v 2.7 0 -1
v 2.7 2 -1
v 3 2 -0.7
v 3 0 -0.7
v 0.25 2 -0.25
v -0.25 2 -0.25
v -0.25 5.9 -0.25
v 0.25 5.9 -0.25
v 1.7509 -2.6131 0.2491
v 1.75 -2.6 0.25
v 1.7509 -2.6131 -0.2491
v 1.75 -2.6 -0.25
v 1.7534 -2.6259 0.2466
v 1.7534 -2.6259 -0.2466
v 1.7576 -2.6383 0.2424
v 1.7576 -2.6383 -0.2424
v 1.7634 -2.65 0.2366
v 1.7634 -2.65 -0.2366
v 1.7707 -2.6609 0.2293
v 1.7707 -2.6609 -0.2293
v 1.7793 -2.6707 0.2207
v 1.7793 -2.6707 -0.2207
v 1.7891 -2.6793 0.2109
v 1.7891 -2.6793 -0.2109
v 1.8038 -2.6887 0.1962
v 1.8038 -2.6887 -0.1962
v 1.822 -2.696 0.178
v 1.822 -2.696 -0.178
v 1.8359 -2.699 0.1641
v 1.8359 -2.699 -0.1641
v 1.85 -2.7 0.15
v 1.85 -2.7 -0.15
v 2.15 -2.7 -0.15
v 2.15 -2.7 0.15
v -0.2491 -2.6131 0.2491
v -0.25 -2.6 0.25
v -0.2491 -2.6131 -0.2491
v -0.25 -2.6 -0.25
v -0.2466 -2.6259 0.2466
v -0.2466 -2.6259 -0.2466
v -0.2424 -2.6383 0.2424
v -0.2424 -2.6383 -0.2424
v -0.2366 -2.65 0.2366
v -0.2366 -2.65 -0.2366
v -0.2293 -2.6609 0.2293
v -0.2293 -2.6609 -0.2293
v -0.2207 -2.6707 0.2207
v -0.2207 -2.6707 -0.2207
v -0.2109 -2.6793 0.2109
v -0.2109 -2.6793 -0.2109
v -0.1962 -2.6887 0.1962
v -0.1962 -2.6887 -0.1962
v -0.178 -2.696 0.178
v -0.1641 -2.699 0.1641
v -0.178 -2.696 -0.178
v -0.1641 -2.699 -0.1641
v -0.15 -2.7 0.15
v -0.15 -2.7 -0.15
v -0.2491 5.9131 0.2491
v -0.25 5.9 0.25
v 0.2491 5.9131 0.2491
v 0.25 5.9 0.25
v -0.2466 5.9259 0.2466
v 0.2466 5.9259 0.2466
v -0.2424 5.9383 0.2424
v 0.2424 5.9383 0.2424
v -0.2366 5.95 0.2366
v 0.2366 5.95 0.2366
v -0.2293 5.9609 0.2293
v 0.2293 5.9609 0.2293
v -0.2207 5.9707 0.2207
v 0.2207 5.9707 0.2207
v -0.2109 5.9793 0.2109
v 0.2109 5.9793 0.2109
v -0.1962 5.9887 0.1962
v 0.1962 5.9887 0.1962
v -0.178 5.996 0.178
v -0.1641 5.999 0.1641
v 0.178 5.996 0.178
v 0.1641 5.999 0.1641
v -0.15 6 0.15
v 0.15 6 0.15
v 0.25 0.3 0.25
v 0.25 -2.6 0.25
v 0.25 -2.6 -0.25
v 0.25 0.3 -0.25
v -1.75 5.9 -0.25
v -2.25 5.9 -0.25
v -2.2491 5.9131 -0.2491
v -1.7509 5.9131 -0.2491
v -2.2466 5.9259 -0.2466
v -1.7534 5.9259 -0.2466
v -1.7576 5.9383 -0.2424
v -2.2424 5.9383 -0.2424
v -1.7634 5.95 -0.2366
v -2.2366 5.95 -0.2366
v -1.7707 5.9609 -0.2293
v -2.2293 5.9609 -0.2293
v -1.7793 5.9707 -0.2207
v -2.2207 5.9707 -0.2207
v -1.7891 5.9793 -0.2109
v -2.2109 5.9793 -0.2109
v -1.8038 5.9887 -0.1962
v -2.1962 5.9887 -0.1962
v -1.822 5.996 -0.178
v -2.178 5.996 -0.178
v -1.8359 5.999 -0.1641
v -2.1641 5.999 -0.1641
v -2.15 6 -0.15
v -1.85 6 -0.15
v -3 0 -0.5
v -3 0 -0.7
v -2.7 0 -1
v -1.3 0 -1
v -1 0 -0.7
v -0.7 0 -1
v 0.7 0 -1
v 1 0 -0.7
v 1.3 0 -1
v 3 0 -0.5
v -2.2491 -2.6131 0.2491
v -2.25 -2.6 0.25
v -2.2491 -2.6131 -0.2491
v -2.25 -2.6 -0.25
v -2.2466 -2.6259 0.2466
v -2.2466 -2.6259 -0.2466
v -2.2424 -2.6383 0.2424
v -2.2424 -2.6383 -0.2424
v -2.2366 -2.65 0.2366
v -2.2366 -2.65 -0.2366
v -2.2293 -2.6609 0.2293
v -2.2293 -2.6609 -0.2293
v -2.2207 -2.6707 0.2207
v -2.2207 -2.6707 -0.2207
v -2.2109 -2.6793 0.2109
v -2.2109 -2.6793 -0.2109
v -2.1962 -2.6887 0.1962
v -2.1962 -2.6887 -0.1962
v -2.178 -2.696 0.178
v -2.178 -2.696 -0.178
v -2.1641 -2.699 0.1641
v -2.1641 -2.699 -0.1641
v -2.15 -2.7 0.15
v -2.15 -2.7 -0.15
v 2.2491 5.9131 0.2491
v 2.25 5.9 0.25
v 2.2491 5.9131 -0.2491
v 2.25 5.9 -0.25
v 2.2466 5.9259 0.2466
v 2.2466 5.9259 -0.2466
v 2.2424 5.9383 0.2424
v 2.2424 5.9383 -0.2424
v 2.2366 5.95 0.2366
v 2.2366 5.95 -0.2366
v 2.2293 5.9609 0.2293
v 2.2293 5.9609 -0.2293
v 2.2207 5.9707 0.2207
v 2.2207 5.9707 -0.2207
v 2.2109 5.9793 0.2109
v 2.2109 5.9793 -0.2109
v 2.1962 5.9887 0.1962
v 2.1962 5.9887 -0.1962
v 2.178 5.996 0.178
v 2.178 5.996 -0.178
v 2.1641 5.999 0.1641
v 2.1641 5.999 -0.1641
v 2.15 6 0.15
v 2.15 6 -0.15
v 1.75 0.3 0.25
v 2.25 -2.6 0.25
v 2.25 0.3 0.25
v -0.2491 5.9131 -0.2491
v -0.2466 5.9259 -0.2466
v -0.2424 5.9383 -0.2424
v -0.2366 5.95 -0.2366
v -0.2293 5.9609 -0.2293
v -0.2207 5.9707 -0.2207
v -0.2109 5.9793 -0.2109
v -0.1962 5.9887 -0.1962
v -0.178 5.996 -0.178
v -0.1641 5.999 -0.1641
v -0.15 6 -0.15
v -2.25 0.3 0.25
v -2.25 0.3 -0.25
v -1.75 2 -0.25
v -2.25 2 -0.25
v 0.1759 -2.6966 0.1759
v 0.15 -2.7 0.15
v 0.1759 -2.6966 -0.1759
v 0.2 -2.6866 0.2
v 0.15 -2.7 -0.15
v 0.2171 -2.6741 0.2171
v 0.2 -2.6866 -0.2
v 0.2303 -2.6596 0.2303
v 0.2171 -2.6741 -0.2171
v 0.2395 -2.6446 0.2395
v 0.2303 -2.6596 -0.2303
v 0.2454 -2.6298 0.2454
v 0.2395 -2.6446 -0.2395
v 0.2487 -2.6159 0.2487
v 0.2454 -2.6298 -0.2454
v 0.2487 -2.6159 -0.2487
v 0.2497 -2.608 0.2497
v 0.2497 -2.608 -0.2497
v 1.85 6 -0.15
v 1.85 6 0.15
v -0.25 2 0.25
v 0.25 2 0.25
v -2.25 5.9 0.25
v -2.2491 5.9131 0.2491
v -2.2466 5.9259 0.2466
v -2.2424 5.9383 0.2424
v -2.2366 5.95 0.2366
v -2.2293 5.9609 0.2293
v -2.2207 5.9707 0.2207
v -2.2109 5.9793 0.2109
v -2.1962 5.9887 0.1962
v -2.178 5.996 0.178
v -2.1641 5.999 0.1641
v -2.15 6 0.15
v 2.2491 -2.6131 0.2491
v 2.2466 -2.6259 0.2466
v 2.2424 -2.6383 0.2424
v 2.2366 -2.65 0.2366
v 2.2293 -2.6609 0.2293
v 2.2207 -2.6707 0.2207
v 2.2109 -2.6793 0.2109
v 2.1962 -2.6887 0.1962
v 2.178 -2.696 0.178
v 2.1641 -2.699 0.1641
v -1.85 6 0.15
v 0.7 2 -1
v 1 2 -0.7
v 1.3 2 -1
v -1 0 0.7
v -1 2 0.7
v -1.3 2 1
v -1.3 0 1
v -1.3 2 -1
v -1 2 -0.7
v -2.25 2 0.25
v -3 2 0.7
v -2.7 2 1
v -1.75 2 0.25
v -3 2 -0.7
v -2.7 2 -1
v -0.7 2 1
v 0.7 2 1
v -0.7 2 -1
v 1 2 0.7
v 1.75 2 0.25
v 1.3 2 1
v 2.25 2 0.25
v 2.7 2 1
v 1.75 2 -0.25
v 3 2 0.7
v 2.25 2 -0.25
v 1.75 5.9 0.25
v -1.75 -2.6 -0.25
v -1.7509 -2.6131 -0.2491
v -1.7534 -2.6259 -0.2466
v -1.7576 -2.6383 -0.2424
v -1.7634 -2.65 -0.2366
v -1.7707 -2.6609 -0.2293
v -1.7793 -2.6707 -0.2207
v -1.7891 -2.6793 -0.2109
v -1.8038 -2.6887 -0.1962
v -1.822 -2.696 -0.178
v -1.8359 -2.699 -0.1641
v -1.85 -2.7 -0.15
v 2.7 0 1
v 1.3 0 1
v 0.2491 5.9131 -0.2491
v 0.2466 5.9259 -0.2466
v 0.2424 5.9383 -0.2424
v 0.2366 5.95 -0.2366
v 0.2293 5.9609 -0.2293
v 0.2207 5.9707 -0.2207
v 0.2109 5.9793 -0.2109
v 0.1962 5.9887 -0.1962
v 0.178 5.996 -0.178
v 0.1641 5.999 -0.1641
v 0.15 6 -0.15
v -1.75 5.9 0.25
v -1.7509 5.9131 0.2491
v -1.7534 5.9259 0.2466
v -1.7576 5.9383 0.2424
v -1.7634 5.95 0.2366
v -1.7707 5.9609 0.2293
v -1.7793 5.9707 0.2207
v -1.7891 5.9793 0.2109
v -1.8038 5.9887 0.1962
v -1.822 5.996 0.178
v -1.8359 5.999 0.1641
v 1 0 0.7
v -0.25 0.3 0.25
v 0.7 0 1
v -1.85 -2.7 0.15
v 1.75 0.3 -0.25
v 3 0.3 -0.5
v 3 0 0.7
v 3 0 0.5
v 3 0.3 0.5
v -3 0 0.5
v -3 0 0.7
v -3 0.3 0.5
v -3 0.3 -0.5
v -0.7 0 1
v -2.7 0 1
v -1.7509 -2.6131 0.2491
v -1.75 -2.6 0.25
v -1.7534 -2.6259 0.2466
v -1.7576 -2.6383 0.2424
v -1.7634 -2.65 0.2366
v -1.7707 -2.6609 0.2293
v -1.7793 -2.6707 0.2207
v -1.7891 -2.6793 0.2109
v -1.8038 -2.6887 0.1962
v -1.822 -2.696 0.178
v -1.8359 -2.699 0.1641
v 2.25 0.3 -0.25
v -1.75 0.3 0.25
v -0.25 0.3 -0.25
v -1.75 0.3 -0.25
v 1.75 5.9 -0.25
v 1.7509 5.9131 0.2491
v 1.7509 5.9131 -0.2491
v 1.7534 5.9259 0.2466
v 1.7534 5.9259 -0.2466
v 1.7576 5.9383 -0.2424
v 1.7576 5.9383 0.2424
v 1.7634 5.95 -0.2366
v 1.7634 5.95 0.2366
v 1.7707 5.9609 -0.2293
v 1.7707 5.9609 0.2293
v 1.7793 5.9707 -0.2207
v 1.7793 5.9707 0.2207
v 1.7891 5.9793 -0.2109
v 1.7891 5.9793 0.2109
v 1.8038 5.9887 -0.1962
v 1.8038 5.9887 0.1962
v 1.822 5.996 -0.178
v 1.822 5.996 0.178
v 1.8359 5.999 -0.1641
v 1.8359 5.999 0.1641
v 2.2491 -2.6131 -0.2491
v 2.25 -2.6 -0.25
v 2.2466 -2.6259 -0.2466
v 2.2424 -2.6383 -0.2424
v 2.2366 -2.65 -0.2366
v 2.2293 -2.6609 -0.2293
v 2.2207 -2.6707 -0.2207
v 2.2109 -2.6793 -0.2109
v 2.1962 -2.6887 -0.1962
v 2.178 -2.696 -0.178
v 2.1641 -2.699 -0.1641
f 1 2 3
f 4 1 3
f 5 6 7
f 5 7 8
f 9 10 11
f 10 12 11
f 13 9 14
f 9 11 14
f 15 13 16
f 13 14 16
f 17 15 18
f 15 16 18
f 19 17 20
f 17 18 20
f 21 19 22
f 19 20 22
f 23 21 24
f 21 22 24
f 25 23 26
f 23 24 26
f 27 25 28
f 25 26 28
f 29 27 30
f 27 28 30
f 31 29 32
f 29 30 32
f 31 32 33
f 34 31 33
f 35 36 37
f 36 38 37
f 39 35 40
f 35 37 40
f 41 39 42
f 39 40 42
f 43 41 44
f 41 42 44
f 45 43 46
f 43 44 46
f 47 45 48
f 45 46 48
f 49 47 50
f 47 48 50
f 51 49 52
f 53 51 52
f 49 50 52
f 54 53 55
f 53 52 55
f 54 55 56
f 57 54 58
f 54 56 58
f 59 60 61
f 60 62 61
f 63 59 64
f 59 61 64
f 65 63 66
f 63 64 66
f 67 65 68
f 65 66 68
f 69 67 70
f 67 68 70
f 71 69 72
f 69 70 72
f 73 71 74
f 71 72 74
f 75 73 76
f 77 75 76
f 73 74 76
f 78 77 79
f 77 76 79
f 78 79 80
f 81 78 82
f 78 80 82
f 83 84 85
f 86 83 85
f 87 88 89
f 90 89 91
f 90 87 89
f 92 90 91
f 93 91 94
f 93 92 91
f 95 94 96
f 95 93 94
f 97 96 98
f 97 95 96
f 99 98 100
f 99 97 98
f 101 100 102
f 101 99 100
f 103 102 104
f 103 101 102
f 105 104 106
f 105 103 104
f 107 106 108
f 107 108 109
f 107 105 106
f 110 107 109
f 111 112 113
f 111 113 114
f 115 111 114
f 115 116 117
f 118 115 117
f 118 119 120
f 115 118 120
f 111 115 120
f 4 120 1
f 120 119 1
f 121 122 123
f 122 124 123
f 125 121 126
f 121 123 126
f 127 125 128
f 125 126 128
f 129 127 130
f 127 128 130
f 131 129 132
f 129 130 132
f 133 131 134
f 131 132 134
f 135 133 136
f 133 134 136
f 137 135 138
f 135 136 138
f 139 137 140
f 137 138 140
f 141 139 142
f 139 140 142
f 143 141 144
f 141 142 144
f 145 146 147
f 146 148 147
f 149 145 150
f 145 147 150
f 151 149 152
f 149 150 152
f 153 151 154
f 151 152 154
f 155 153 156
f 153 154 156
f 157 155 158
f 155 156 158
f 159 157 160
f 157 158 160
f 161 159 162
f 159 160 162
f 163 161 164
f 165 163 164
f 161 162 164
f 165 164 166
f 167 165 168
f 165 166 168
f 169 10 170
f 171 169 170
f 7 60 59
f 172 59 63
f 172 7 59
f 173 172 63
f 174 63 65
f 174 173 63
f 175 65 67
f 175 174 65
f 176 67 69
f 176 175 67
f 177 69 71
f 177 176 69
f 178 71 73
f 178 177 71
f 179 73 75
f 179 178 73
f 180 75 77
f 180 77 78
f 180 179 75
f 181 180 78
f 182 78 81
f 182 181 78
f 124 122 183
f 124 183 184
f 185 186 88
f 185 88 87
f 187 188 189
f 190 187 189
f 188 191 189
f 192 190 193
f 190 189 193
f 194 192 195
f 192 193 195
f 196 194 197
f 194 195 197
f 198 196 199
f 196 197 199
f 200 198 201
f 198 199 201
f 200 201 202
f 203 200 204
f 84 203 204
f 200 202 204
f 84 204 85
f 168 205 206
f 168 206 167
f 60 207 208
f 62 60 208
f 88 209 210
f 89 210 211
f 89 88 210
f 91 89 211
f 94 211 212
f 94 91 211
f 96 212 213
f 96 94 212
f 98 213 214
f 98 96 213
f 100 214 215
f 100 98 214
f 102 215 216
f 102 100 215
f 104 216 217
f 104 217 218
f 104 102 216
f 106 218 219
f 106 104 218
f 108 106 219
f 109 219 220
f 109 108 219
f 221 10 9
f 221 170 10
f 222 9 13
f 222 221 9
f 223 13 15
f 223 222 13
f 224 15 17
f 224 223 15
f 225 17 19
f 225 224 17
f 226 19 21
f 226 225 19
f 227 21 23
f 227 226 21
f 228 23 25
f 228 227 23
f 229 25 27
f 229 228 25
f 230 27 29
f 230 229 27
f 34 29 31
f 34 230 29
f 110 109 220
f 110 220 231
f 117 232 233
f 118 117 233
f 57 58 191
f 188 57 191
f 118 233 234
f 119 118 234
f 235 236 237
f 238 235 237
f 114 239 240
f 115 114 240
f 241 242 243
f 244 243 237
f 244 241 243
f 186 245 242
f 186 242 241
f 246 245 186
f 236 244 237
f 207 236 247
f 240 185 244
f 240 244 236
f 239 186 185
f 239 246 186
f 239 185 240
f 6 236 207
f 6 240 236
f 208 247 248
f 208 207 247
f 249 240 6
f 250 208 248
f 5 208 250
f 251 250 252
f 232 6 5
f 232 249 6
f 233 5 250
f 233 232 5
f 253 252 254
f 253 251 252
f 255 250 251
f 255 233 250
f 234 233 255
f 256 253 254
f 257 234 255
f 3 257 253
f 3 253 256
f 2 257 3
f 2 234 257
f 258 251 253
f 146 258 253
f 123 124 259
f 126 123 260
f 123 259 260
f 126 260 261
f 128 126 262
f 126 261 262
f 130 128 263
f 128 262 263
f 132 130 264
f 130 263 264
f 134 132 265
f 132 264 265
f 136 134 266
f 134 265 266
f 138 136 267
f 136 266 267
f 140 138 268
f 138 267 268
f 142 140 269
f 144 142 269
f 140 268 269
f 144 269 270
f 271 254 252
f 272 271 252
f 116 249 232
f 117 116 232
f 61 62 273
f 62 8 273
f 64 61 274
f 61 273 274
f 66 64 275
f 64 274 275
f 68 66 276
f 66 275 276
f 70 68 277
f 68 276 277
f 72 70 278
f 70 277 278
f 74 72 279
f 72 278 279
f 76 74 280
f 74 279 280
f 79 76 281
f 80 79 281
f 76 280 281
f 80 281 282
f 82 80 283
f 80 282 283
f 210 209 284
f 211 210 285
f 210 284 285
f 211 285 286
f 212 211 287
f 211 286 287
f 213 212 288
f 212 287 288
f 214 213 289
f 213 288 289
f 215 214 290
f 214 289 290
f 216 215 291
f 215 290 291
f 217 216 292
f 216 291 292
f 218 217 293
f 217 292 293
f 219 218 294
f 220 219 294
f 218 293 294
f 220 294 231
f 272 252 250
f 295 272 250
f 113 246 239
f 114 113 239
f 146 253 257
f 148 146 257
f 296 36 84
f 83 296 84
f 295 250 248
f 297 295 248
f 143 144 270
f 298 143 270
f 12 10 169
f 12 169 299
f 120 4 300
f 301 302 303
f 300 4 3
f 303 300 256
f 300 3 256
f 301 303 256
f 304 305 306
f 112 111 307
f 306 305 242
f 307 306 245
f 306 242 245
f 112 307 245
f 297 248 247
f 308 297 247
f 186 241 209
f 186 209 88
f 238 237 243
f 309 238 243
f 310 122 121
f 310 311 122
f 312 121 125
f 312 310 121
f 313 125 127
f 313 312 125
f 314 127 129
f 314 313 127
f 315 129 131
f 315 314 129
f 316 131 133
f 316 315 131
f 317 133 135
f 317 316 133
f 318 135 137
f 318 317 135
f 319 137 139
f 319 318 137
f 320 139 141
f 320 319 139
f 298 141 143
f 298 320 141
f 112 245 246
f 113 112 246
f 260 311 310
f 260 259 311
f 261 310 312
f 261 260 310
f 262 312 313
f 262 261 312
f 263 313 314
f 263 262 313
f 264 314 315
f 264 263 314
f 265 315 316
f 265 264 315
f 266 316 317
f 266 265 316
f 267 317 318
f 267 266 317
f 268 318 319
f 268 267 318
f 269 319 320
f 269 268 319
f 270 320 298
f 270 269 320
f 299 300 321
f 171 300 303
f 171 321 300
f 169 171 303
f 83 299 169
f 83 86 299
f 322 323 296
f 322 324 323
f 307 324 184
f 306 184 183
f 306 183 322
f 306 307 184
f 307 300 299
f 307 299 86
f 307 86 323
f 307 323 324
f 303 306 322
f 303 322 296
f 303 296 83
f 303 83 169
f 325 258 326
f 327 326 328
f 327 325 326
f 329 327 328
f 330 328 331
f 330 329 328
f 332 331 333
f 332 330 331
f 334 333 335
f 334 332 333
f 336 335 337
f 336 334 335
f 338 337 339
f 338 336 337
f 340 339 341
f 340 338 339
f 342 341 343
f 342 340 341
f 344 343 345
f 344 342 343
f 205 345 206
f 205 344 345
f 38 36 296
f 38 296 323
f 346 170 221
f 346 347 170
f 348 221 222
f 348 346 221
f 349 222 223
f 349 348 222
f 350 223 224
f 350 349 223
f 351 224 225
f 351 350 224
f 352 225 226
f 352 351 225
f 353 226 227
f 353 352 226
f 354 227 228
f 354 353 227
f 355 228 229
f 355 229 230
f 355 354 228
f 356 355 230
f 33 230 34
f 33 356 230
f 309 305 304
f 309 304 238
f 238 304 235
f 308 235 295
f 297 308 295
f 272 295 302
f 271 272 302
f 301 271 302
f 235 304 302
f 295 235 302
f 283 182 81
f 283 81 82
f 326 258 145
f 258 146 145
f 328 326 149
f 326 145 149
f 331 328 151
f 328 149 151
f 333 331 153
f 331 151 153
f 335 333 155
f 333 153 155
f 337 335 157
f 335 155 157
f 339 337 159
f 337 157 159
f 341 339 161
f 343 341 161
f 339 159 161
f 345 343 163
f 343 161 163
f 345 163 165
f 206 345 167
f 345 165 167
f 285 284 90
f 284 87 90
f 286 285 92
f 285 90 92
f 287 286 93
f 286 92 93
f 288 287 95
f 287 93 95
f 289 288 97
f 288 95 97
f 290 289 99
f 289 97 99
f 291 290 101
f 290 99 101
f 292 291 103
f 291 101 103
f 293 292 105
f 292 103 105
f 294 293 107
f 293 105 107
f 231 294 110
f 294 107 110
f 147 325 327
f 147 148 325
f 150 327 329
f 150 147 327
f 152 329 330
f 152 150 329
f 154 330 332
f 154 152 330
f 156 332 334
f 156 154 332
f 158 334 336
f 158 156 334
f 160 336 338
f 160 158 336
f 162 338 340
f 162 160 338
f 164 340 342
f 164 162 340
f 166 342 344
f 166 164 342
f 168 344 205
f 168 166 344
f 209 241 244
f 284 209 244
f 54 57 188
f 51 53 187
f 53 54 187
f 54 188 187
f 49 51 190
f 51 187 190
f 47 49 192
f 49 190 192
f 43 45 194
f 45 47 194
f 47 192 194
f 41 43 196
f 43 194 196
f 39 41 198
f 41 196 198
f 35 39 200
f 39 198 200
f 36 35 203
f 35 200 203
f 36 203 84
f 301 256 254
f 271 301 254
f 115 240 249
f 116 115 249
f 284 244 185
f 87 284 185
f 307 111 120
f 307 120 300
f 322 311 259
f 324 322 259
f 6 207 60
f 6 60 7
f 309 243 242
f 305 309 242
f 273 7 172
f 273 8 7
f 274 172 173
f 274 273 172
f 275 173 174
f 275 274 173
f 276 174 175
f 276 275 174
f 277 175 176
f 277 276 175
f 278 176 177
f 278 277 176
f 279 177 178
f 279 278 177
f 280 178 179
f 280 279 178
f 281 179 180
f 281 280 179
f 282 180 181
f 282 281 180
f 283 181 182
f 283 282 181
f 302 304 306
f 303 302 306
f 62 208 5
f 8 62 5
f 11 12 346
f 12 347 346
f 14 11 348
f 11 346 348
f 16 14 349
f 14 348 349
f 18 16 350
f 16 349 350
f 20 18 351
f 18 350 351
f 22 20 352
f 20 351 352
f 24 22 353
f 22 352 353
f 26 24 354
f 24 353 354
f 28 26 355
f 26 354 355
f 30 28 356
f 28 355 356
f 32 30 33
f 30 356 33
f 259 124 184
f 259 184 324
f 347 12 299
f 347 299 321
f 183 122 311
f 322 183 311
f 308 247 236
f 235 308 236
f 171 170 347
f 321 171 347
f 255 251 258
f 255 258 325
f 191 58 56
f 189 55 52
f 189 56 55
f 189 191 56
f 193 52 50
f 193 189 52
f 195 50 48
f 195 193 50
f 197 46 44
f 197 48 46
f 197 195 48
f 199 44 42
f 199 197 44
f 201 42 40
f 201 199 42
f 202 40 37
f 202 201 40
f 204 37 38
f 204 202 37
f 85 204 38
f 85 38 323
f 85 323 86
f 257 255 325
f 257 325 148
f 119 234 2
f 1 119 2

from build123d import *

# Parameters (mm, degrees)
SZKIC1_W                         = 6
SZKIC1_H                         = 2
DODANIE_WYCI_GNI_CIE1_DEPTH      = 2
SZKIC2_W                         = 8
SZKIC2_H                         = 4
WYTNIJ_WYCI_GNI_CIE1_DEPTH       = 2
WYTNIJ_WYCI_GNI_CIE2_REACH       = 8.403
SZKIC4_W                         = 1
SZKIC4_H                         = 0.3
DODANIE_WYCI_GNI_CIE2_DEPTH      = 6
DODANIE_WYCI_GNI_CIE2_DEPTH_BACK = 2.7
SZKIC3_W                         = 0.5
SZKIC3_H                         = 0.5
ZAOKR_GLENIE1_R                  = 0.1


with BuildPart() as part:
    # Szkic1 → Dodanie-wyciągnięcie1 (new body)
    with BuildSketch(Plane(origin=(0, 0, 0), x_dir=(1, 0, 0), z_dir=(0, 1, 0))):
        Rectangle(SZKIC1_W, SZKIC1_H)
    extrude(amount=DODANIE_WYCI_GNI_CIE1_DEPTH)

    # Szkic2 → Wytnij-wyciągnięcie1 (cut)
    with BuildSketch(Plane(origin=(0, 2, 0), x_dir=(1, 0, 0), z_dir=(0, 1, 0))):
        Rectangle(SZKIC2_W, SZKIC2_H)
        Polygon((2.7, 1), (3, 0.7), (3, -0.7), (2.7, -1), (1.3, -1), (1, -0.7), (0.7, -1), (-0.7, -1), (-1, -0.7), (-1.3, -1), (-2.7, -1), (-3, -0.7), (-3, 0.7), (-2.7, 1), (-1.3, 1), (-1, 0.7), (-0.7, 1), (0.7, 1), (1, 0.7), (1.3, 1), align=None, mode=Mode.SUBTRACT)
    extrude(amount=-WYTNIJ_WYCI_GNI_CIE1_DEPTH, mode=Mode.SUBTRACT)

    # Szkic4 → Wytnij-wyciągnięcie2 (cut, up to next)
    with BuildSketch(Plane.ZY.offset(3), mode=Mode.PRIVATE) as wytnij_wyci_gni_cie2_sk1:
        with Locations((0, 0.15)):
            Rectangle(SZKIC4_W, SZKIC4_H)
    wytnij_wyci_gni_cie2_tool1 = extrude(wytnij_wyci_gni_cie2_sk1.sketch, amount=-WYTNIJ_WYCI_GNI_CIE2_REACH, mode=Mode.PRIVATE) & part.part
    add(wytnij_wyci_gni_cie2_tool1.solids().sort_by_distance((-3, 0.15, 0))[0], mode=Mode.SUBTRACT)

    # Szkic3 → Dodanie-wyciągnięcie2 (add, two sides: drawn at the far end of the back side and taken through both)
    with BuildSketch(Plane(origin=(0, 0, 0), x_dir=(1, 0, 0), z_dir=(0, 1, 0)).offset(-DODANIE_WYCI_GNI_CIE2_DEPTH_BACK)):
        Rectangle(SZKIC3_W, SZKIC3_H)
        with Locations((2, 0)):
            Rectangle(SZKIC3_W, SZKIC3_H)
        with Locations((-2, 0)):
            Rectangle(SZKIC3_W, SZKIC3_H)
    extrude(amount=DODANIE_WYCI_GNI_CIE2_DEPTH + DODANIE_WYCI_GNI_CIE2_DEPTH_BACK)

    # Zaokrąglenie1
    zaokr_glenie1_edges = [part.edges().sort_by_distance(p)[0] for p in [
        (-0.25, -2.7, 0),
        (0, -2.7, -0.25),
        (0.25, -2.7, 0),
        (0, -2.7, 0.25),
        (-0.25, 6, 0),
        (0, 6, 0.25),
        (0.25, 6, 0),
        (0, 6, -0.25),
        (1.75, -2.7, 0),
        (2, -2.7, -0.25),
        (2.25, -2.7, 0),
        (2, -2.7, 0.25),
        (1.75, 6, 0),
        (2, 6, 0.25),
        (2.25, 6, 0),
        (2, 6, -0.25),
        (-2.25, -2.7, 0),
        (-2, -2.7, -0.25),
        (-1.75, -2.7, 0),
        (-2, -2.7, 0.25),
        (-2.25, 6, 0),
        (-2, 6, 0.25),
        (-1.75, 6, 0),
        (-2, 6, -0.25),
    ]]
    fillet(zaokr_glenie1_edges, radius=ZAOKR_GLENIE1_R)


solid = part.part
